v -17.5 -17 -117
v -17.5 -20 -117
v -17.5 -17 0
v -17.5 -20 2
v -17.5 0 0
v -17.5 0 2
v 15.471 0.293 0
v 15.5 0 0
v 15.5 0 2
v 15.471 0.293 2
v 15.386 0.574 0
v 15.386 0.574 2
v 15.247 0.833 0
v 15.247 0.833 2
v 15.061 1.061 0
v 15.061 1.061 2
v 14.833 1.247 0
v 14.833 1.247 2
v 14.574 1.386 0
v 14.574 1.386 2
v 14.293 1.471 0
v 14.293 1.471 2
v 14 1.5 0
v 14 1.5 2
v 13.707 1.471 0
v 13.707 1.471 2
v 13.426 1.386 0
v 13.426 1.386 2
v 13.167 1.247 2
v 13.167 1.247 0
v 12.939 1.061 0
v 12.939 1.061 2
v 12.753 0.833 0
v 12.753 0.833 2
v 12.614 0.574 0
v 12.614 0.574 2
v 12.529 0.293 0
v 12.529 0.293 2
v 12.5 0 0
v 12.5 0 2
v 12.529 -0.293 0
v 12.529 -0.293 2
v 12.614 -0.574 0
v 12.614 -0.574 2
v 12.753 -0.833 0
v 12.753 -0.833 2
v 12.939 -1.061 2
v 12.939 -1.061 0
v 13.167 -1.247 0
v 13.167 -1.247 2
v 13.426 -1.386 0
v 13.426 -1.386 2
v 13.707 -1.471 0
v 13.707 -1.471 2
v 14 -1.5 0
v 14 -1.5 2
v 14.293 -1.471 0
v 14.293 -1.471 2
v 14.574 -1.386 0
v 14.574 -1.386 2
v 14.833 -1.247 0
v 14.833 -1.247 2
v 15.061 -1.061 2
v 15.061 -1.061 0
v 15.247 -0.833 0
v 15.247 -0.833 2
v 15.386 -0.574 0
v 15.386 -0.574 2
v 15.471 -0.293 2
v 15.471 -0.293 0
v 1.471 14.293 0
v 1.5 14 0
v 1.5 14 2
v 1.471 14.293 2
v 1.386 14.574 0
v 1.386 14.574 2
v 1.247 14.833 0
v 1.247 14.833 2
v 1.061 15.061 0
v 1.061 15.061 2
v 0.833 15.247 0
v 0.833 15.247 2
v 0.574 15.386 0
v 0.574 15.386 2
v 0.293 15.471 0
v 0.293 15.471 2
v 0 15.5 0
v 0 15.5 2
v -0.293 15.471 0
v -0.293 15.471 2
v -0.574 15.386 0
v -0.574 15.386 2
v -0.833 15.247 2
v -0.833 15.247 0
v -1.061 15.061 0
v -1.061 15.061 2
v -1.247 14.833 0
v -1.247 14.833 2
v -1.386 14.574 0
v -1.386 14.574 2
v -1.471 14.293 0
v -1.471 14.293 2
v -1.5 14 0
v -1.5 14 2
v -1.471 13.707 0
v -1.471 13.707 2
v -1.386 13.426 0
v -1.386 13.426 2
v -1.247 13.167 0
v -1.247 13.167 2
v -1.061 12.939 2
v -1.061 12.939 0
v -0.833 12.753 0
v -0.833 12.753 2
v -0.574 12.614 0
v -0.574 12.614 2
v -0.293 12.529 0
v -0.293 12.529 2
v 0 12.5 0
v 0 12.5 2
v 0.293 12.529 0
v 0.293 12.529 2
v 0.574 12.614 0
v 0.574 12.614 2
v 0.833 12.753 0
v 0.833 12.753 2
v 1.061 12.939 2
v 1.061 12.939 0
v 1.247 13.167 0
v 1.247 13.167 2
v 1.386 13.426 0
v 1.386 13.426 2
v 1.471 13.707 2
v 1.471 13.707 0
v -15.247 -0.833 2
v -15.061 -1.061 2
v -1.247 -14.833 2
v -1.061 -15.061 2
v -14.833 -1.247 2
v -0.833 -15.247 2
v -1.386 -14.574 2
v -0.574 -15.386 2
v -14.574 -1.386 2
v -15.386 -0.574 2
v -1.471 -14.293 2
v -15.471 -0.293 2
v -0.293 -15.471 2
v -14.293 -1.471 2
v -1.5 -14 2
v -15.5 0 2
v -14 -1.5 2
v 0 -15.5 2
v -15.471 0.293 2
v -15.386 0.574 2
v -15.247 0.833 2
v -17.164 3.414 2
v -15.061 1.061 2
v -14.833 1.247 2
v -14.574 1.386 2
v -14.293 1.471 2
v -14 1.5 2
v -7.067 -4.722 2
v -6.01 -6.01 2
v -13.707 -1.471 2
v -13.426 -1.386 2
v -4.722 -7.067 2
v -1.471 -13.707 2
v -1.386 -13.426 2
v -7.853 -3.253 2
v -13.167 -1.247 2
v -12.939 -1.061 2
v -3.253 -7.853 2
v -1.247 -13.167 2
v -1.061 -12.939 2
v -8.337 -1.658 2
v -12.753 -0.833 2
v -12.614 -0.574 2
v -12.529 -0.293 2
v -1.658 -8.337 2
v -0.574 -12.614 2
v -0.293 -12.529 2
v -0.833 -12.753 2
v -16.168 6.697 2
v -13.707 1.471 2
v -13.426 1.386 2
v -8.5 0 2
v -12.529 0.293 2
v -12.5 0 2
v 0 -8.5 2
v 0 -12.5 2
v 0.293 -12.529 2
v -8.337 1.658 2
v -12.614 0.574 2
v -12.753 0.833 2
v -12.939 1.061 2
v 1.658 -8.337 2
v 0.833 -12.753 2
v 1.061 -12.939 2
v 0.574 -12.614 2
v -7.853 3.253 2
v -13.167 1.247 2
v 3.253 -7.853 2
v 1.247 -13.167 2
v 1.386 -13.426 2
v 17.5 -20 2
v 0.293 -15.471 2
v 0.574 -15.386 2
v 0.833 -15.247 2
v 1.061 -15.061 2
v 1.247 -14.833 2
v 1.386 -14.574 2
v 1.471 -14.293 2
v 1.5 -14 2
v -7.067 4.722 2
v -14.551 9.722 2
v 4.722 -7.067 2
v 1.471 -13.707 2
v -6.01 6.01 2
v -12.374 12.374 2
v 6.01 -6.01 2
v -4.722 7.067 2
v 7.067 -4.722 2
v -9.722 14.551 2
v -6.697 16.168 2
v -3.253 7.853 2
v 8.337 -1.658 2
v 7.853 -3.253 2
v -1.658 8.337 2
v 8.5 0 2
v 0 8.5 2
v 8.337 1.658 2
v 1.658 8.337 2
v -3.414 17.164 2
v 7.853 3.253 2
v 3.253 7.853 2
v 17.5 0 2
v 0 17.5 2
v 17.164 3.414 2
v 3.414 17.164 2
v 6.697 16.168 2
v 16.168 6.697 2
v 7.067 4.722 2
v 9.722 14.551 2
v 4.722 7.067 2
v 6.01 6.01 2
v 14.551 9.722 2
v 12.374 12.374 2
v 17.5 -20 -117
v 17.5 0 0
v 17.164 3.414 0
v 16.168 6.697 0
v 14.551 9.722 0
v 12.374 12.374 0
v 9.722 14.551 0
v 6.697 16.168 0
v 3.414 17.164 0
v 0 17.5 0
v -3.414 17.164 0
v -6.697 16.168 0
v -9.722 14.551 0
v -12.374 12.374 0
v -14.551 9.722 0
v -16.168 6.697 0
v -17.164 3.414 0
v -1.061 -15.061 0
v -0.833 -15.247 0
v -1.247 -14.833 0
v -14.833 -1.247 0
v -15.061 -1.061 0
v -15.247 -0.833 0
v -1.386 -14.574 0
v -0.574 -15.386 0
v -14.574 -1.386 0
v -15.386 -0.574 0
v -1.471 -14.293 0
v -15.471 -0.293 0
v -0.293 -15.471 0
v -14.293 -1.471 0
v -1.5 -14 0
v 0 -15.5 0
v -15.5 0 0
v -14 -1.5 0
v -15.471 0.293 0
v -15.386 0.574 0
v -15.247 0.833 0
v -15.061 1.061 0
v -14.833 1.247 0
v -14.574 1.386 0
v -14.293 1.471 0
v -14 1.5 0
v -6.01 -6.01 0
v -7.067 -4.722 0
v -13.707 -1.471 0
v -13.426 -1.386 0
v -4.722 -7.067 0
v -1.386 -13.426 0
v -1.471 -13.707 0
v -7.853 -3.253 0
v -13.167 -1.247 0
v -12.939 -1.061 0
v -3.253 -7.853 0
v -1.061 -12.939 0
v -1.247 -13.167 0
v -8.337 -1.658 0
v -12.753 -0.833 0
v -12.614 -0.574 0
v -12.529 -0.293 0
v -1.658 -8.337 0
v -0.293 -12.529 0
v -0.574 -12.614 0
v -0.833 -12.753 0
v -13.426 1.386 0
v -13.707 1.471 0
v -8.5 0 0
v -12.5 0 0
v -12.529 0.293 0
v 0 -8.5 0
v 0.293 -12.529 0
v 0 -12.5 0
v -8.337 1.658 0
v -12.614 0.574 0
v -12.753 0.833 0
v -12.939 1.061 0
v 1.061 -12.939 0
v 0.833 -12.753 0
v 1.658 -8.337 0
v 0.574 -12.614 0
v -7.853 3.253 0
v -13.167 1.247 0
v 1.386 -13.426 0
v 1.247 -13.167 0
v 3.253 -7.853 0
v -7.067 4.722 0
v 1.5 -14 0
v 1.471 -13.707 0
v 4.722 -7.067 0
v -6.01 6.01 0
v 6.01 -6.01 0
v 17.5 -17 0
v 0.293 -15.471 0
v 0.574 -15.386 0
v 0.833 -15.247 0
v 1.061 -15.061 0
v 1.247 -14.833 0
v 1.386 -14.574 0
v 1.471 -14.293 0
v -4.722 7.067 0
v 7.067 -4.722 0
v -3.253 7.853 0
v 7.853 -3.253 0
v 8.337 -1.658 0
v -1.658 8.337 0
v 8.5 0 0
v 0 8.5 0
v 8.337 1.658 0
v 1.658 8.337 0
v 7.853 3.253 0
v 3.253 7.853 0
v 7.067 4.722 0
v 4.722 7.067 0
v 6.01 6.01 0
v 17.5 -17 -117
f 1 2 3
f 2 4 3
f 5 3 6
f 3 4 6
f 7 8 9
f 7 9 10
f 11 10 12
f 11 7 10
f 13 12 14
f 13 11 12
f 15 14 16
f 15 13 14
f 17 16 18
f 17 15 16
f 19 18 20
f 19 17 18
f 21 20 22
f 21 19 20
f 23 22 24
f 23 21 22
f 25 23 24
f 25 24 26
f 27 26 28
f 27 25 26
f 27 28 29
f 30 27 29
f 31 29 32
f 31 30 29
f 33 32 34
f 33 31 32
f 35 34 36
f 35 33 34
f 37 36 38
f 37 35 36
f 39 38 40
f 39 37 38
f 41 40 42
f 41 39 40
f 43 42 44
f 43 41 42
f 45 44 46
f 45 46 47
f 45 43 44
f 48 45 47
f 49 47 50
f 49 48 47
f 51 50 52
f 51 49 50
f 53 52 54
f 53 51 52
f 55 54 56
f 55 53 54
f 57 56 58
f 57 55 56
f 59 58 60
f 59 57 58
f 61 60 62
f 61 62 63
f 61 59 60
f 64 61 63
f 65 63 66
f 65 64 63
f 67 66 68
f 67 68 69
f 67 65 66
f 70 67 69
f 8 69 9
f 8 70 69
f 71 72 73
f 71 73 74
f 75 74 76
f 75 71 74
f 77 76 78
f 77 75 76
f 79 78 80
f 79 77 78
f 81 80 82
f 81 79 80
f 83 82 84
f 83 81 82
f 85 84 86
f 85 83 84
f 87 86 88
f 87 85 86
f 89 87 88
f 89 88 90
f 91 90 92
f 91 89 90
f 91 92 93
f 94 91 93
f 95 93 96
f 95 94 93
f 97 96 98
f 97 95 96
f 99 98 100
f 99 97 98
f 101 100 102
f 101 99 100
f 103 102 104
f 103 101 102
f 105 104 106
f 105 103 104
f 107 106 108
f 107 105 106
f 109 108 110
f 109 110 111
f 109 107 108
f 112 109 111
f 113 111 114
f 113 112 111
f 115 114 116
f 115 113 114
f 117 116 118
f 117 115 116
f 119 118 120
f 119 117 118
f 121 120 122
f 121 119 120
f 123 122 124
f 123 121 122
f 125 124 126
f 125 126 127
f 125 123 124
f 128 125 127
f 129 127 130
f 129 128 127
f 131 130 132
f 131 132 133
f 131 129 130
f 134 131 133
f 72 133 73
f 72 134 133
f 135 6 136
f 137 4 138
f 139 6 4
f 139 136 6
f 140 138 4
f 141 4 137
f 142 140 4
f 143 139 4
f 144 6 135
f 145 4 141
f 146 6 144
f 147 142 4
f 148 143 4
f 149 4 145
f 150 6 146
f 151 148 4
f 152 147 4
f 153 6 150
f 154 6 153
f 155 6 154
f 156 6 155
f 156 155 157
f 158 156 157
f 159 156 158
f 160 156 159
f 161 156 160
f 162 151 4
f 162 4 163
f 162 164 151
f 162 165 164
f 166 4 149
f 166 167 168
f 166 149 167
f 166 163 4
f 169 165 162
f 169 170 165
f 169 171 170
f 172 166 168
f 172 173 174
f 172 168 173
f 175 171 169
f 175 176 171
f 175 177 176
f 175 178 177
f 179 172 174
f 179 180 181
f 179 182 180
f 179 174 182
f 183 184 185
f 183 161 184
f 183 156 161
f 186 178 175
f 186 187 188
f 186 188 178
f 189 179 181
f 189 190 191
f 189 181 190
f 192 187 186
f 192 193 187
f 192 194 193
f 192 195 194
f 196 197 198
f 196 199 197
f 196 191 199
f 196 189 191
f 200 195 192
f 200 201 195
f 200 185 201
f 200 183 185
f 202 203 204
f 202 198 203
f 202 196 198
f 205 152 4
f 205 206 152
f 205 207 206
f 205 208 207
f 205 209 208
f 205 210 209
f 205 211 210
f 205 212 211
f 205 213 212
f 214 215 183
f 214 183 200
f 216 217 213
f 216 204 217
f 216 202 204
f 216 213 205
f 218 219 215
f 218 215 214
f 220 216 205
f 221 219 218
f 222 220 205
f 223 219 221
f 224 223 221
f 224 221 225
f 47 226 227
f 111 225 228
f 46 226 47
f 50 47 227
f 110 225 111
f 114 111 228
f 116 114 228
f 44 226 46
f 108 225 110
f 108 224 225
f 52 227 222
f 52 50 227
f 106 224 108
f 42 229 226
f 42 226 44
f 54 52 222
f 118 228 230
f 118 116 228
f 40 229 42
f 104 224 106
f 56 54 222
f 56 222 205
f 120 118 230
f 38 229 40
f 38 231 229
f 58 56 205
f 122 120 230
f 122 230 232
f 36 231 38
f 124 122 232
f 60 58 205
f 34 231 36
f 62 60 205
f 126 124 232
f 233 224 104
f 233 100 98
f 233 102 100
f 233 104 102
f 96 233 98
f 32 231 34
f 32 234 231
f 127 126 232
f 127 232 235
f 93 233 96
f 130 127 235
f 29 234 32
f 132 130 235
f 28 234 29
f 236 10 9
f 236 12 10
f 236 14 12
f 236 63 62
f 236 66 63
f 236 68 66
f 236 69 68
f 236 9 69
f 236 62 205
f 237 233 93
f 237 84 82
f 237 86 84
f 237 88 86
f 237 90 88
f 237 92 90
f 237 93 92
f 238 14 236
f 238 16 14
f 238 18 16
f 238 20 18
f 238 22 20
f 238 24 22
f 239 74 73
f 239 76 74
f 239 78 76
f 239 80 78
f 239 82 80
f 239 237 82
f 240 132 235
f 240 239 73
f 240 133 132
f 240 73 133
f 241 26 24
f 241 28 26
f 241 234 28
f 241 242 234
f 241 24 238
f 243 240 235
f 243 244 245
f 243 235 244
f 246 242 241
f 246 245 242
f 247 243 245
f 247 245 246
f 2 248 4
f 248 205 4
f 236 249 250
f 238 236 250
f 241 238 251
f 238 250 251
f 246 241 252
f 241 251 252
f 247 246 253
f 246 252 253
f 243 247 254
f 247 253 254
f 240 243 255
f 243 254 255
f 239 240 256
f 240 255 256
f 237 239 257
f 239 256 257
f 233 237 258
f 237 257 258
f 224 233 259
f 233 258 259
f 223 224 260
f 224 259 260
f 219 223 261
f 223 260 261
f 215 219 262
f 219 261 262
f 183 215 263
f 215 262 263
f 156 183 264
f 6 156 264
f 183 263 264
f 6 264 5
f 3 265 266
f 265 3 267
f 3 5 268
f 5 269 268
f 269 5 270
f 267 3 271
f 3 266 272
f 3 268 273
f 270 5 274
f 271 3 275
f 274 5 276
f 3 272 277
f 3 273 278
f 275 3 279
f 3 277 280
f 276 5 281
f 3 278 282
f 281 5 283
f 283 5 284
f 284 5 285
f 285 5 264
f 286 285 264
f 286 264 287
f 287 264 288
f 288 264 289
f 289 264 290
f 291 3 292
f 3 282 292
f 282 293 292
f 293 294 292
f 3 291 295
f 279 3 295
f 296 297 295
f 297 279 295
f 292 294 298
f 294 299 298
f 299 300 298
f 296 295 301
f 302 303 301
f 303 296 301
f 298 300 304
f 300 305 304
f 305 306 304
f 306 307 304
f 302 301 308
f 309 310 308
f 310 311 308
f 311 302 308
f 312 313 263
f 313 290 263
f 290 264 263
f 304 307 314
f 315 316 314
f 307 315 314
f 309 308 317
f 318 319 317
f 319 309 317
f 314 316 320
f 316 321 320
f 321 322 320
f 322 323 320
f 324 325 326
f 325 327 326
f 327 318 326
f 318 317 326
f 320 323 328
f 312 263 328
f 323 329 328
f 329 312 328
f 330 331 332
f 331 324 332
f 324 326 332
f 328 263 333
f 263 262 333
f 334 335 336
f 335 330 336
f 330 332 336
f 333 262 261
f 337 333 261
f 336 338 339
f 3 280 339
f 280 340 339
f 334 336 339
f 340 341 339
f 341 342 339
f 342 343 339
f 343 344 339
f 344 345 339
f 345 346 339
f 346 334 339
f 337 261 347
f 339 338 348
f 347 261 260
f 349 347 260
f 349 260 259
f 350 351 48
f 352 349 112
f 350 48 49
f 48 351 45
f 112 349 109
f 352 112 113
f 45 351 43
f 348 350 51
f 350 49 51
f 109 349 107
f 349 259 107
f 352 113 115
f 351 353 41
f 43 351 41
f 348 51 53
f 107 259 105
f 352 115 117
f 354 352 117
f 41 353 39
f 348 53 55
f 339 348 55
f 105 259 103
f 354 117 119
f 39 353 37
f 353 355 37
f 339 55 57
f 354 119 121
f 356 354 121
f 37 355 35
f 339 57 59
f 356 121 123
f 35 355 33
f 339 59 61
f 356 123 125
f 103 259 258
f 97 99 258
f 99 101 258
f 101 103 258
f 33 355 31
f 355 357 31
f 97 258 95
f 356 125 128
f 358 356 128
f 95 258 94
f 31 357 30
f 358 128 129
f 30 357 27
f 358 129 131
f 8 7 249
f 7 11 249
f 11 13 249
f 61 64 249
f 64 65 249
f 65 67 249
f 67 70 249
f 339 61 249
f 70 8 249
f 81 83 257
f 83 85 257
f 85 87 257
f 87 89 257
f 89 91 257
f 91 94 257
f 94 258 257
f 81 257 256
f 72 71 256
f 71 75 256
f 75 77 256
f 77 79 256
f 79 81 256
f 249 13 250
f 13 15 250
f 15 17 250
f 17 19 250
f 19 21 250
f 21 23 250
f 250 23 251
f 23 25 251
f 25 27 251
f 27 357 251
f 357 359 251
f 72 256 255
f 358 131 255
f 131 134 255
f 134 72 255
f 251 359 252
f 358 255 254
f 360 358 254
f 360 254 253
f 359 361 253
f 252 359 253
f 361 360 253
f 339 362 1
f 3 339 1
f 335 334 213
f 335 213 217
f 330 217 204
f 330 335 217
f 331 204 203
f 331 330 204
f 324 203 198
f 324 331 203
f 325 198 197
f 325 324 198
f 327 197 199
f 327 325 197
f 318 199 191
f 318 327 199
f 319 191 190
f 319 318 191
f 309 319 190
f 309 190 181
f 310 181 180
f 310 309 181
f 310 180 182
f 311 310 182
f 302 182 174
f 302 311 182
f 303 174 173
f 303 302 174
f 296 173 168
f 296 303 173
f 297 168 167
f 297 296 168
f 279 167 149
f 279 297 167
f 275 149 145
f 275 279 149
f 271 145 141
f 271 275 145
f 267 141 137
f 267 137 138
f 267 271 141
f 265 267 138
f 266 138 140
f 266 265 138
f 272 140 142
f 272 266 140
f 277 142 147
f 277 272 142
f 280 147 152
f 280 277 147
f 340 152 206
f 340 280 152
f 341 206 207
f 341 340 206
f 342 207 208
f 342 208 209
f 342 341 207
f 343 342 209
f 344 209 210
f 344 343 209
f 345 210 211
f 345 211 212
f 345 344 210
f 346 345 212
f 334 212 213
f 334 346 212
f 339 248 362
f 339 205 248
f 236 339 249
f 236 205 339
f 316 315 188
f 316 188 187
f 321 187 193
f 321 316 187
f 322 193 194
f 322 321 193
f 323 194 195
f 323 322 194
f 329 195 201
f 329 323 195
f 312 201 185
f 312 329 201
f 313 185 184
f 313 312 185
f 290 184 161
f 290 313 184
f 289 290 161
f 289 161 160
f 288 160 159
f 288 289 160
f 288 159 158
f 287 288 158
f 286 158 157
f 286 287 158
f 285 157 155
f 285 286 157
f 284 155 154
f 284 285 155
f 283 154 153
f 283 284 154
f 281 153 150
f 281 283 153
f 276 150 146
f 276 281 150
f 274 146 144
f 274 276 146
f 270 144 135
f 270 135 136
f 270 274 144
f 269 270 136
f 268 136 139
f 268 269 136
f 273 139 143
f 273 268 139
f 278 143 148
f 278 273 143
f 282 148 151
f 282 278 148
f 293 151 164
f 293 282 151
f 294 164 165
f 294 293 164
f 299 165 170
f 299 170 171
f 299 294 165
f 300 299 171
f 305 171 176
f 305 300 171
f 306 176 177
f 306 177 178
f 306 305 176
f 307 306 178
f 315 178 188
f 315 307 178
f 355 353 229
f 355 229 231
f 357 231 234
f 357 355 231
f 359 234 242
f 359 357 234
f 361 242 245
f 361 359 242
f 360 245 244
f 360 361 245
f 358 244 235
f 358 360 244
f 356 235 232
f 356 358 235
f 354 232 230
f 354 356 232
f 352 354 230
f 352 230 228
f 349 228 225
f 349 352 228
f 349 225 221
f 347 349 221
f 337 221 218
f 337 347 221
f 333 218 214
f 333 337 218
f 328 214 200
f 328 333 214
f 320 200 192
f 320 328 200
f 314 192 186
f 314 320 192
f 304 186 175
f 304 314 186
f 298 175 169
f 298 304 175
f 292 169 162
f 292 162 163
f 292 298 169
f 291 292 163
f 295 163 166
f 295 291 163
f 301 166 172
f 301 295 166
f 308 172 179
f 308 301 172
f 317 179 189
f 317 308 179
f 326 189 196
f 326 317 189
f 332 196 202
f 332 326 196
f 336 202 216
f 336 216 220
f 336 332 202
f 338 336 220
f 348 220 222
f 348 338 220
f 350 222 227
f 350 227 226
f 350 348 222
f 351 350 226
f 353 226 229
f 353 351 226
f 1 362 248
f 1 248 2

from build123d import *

# Parameters (mm, degrees)
SKETCH1_R           = 1.5
SKETCH1_R_2         = 8.5
BOSS_EXTRUDE1_DEPTH = 2
SKETCH2_W           = 35
SKETCH2_H           = 3
BOSS_EXTRUDE2_DEPTH = 117


with BuildPart() as part:
    # Sketch1 → Boss-Extrude1 (new body)
    with BuildSketch(Plane.XY):
        with BuildLine():
            Line((-17.5, 0), (-17.5, -20))
            Line((-17.5, -20), (17.5, -20))
            Line((17.5, -20), (17.5, 0))
            ThreePointArc((17.5, 0), (0, 17.5), (-17.5, 0))
        make_face()
        with Locations((0, 14)):
            Circle(SKETCH1_R, mode=Mode.SUBTRACT)
        with Locations((14, 0)):
            Circle(SKETCH1_R, mode=Mode.SUBTRACT)
        with Locations((0, -14)):
            Circle(SKETCH1_R, mode=Mode.SUBTRACT)
        with Locations((-14, 0)):
            Circle(SKETCH1_R, mode=Mode.SUBTRACT)
        Circle(SKETCH1_R_2, mode=Mode.SUBTRACT)
    extrude(amount=BOSS_EXTRUDE1_DEPTH)

    # Sketch2 → Boss-Extrude2 (add)
    with BuildSketch(Plane(origin=(0, 0, 0), x_dir=(-1, 0, 0), z_dir=(0, 0, -1))):
        with Locations((0, -18.5)):
            Rectangle(SKETCH2_W, SKETCH2_H)
    extrude(amount=BOSS_EXTRUDE2_DEPTH)


solid = part.part
